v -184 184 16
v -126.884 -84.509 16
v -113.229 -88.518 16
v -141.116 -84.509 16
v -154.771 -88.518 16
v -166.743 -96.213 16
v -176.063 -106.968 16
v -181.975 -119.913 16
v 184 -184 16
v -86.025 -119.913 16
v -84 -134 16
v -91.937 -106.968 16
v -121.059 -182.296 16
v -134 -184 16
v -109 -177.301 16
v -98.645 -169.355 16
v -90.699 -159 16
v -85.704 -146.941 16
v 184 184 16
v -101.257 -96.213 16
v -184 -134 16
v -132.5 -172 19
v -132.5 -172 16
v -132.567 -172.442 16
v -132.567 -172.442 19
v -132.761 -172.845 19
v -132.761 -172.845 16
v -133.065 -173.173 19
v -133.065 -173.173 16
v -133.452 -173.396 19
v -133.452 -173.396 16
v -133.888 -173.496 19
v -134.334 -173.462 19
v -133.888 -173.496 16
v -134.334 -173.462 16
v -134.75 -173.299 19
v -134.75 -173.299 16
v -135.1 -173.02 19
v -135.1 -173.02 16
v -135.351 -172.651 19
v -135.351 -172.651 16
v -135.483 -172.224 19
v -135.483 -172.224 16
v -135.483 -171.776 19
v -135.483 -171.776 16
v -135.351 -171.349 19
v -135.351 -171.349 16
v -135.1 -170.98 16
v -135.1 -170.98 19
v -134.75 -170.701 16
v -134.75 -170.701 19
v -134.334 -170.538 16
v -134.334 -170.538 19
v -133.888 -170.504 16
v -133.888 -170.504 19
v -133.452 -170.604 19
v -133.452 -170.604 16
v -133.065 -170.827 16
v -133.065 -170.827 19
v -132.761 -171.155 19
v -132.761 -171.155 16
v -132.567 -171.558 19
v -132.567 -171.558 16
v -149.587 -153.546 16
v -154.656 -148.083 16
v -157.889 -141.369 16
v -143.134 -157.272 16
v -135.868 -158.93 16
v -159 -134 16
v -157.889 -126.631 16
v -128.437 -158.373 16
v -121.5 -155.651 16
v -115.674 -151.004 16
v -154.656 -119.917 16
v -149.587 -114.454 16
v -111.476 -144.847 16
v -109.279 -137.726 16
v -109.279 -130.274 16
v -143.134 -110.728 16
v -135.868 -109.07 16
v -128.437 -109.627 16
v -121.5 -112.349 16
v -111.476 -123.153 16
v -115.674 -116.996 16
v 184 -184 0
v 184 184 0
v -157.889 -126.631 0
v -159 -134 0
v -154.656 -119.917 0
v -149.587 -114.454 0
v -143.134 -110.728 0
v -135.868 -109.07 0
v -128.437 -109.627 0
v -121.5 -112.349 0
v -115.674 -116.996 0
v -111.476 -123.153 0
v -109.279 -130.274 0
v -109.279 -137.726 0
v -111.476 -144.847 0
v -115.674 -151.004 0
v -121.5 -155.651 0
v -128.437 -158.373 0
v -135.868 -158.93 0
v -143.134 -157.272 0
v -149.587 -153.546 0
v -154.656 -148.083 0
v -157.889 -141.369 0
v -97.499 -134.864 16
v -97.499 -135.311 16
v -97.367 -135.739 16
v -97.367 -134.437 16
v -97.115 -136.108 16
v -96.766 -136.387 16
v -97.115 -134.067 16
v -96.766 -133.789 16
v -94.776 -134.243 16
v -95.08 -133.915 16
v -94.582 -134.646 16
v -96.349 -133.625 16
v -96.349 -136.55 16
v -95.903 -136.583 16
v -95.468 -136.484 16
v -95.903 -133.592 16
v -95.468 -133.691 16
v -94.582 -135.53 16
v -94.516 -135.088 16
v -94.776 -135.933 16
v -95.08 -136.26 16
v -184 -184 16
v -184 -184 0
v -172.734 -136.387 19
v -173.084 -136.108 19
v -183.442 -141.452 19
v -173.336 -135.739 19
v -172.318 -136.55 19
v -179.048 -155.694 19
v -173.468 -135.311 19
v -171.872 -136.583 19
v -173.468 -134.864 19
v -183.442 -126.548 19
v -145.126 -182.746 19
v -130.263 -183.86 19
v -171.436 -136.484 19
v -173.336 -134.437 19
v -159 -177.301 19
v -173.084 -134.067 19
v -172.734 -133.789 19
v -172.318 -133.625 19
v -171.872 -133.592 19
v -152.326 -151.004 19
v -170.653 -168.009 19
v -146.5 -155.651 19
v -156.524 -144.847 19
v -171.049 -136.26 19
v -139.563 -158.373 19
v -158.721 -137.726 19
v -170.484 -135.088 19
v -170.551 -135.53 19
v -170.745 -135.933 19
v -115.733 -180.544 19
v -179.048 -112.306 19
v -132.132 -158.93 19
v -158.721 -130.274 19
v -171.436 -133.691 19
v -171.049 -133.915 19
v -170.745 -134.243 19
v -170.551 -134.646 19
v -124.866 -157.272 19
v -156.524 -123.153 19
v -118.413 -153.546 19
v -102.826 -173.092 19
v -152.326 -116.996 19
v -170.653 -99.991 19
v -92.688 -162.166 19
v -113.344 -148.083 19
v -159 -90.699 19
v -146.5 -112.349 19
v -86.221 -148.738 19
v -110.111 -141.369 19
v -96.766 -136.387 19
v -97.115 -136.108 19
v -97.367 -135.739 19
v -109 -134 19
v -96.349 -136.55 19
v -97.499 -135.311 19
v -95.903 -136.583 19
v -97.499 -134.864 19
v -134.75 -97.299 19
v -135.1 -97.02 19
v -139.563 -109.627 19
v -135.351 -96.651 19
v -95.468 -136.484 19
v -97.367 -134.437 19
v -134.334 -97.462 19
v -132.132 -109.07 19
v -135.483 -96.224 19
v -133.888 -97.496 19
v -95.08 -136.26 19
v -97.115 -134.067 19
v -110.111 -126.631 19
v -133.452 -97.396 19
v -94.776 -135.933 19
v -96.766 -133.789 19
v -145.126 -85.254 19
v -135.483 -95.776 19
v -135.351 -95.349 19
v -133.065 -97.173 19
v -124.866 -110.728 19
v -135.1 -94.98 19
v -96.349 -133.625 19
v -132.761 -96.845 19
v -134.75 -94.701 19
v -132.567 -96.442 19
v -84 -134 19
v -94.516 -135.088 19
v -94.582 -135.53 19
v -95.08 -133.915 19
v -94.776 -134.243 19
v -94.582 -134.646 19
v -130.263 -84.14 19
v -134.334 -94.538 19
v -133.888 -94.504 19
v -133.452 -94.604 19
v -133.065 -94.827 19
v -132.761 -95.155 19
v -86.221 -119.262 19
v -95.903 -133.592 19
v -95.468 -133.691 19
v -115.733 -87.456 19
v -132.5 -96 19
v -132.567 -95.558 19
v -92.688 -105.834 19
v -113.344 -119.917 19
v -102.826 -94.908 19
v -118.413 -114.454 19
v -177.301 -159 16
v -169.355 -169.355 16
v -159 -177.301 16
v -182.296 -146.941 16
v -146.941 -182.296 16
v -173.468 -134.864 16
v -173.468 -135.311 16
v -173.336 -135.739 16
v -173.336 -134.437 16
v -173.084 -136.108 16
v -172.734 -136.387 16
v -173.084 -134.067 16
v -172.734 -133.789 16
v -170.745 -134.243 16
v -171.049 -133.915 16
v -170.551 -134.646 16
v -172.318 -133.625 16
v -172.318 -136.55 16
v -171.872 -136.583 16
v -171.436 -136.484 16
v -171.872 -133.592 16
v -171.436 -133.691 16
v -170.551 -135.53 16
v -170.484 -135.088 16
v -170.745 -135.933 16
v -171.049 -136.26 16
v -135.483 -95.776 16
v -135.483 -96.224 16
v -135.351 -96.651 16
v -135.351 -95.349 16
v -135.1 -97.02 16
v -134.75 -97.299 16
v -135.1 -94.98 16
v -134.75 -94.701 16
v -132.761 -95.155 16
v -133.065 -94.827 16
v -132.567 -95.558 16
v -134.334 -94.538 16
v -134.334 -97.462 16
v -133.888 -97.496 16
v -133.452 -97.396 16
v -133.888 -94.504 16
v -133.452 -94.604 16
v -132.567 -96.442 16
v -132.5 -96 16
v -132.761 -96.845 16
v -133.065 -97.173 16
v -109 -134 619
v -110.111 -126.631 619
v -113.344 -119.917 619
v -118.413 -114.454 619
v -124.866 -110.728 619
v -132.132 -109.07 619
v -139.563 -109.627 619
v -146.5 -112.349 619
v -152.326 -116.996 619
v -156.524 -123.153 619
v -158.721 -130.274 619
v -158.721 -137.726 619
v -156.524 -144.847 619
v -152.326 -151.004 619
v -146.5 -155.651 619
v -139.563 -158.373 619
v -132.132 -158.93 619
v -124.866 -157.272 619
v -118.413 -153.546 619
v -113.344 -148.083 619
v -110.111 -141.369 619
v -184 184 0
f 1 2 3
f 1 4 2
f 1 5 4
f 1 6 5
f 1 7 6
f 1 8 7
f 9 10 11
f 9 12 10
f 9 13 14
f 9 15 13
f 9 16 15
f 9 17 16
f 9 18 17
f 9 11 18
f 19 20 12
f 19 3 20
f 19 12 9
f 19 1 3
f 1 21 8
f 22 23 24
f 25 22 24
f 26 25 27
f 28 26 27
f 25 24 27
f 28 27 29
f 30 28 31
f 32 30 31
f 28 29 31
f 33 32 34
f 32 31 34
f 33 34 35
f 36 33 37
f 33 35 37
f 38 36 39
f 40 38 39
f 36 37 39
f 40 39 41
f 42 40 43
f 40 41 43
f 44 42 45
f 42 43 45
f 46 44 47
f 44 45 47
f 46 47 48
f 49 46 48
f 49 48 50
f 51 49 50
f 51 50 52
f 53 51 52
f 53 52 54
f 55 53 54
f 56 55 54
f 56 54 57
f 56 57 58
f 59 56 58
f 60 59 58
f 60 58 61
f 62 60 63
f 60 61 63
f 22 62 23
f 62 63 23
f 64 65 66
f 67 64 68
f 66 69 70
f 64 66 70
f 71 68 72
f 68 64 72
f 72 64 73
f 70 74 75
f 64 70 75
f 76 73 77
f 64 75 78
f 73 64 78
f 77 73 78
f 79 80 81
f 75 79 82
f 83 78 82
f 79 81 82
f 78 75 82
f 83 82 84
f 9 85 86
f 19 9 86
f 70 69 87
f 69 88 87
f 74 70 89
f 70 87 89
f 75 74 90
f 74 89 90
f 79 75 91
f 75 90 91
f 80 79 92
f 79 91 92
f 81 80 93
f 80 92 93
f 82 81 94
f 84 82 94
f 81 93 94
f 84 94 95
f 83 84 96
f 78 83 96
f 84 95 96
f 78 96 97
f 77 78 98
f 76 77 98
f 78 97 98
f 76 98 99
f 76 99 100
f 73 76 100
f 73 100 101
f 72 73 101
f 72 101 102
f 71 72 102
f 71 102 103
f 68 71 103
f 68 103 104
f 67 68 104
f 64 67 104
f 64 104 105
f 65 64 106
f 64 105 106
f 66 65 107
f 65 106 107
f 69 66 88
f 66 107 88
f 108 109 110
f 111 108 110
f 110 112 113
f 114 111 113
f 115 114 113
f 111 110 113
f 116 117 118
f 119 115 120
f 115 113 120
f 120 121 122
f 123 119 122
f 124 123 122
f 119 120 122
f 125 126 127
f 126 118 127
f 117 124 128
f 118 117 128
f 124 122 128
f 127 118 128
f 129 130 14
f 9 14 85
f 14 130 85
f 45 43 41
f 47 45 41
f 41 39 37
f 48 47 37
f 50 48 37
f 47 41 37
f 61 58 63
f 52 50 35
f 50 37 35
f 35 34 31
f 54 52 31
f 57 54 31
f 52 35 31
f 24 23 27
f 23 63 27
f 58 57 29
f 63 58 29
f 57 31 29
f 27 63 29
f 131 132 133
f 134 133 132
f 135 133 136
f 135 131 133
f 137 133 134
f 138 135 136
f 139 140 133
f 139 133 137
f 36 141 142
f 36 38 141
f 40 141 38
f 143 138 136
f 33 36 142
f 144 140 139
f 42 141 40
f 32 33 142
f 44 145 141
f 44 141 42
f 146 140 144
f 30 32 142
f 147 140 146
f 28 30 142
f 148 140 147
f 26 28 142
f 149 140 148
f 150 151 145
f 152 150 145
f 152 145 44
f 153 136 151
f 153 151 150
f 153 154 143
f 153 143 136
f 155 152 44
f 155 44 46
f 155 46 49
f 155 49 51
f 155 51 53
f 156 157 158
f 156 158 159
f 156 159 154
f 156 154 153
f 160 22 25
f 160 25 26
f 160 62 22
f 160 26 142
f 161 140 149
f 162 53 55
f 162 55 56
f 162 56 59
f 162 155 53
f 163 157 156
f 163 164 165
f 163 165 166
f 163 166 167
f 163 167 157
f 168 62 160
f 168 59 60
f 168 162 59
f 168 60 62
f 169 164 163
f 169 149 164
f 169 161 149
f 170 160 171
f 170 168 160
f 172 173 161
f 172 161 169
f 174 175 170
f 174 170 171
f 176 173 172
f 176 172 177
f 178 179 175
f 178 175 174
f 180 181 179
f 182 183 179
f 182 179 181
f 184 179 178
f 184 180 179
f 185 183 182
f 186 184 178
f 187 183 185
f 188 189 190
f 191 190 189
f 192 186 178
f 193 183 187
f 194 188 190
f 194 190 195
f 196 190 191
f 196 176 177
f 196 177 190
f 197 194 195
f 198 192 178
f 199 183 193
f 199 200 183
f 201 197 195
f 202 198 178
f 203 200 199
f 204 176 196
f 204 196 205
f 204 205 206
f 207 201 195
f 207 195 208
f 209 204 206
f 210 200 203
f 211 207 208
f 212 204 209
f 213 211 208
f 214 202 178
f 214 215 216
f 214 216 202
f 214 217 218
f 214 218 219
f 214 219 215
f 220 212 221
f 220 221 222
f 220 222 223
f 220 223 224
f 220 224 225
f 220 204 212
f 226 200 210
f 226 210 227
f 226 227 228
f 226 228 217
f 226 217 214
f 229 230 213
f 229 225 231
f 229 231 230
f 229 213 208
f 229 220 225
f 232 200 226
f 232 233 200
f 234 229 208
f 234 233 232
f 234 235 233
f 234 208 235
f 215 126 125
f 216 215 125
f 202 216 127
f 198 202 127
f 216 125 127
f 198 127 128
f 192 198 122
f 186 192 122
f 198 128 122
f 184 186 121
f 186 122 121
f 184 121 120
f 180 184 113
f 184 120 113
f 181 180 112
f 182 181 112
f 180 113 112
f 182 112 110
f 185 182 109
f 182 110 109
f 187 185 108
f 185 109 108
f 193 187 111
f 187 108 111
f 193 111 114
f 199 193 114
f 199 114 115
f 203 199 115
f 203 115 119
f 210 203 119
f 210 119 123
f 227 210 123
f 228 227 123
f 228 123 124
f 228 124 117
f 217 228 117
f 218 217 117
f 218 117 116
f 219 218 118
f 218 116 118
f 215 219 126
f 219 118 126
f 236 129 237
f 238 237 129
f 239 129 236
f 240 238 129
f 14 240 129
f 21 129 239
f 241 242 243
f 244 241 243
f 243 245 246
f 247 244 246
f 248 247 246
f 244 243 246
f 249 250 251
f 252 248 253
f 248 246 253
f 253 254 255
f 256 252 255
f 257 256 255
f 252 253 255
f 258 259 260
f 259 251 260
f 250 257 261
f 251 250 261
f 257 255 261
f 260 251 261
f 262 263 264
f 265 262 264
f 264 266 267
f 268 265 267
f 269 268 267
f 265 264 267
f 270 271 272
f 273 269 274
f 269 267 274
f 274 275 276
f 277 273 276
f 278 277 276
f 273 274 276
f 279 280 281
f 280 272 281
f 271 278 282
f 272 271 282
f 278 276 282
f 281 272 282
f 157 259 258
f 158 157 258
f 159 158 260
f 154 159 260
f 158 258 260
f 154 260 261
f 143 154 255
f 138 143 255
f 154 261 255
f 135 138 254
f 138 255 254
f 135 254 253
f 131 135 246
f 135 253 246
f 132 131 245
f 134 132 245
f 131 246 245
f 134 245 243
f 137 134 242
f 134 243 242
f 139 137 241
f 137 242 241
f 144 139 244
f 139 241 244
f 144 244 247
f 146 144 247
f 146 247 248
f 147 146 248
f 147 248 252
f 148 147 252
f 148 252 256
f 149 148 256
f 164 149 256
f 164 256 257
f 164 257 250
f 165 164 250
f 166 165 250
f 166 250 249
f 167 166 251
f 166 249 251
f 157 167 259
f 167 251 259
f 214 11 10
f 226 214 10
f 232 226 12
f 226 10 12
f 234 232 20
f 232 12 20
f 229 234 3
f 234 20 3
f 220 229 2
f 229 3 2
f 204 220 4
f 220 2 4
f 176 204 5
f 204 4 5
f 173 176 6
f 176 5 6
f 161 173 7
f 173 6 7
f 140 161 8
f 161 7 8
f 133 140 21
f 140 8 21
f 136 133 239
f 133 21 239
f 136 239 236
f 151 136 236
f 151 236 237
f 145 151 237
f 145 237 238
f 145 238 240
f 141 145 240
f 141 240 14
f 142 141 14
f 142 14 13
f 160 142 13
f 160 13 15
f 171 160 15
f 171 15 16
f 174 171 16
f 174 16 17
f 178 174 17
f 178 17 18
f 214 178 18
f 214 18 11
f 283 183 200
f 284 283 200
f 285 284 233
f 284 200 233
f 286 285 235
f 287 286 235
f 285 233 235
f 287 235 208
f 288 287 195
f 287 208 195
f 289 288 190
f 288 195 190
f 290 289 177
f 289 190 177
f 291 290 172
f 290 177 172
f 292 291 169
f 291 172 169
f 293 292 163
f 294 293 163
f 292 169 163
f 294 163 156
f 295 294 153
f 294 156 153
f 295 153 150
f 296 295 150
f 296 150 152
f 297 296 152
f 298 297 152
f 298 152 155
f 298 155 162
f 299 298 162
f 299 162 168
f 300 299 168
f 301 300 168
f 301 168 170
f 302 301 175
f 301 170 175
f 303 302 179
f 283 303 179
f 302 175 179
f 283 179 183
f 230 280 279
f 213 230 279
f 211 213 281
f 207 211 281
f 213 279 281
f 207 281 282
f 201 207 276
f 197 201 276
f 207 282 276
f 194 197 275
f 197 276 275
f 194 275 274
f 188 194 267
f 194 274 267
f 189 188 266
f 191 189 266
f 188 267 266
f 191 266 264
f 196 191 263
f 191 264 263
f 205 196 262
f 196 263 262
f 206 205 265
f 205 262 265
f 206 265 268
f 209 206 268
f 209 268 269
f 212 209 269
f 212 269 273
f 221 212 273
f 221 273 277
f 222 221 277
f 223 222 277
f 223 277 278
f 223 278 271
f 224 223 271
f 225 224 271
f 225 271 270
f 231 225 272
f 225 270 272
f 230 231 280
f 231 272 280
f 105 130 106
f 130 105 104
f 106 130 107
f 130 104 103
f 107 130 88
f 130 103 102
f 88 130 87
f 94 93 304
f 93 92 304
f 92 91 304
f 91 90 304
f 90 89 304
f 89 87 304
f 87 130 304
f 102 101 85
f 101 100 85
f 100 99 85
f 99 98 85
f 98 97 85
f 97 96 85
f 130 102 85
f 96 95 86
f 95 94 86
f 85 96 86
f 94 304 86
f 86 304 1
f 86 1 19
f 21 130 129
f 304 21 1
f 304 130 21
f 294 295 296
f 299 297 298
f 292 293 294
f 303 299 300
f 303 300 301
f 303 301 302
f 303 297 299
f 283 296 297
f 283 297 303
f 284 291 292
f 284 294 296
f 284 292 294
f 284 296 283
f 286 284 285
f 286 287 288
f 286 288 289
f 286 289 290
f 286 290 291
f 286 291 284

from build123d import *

# Parameters (mm, degrees)
F0_W     = 368
F0_H     = 368
F1_DEPTH = 16
F3_D     = 50
F3_DEPTH = 16
F3_TIP   = 15.0215154757
F2_R     = 50
F4_DEPTH = 3
F7_R     = 25
F8_DEPTH = 600
F9_D     = 3
F9_DEPTH = 3
F9_TIP   = 0.9012909285


# Not quite as in the source:
# - the program builds the solid bodies; features that only make, move or delete a surface that nothing else refers to are left out


with BuildPart() as f1:
    # F0 (on Top) → F1 (new body)
    with BuildSketch(Plane.XY):
        Rectangle(F0_W, F0_H)
    extrude(amount=F1_DEPTH)

    # F3
    with Locations(Plane.XY.offset(16)):
        with Locations((-134, -134)):
            Hole(F3_D / 2, depth=F3_DEPTH)
            with Locations((0, 0, -(F3_DEPTH + F3_TIP / 2))):  # 118° drill point
                Cone(0, F3_D / 2, F3_TIP, mode=Mode.SUBTRACT)

    # F2 (on face) → F4 (join)
    with BuildSketch(Plane.XY.offset(16)):
        with Locations((-134, -134)):
            Circle(F2_R)
    extrude(amount=F4_DEPTH)

    # F7 (on face) → F8 (join)
    with BuildSketch(Plane.XY.offset(19)):
        with Locations((-134, -134)):
            Circle(F7_R)
    extrude(amount=F8_DEPTH)

    # F9 (one way)
    with BuildSketch(Plane(origin=(0, 0, 16), x_dir=(1, 0, 0), z_dir=(0, 0, -1))):
        with Locations((-134, 96), (-171.9844305378, 135.0876749154), (-96.0155694622, 135.0876749154), (-134, 172)):
            Circle(F9_D / 2)
    extrude(amount=-F9_DEPTH, mode=Mode.SUBTRACT)
    with Locations(Plane(origin=(0, 0, 16), x_dir=(1, 0, 0), z_dir=(0, 0, -1))):
        with Locations((-134, 96), (-171.9844305378, 135.0876749154), (-96.0155694622, 135.0876749154), (-134, 172)):
            with Locations((0, 0, -(F9_DEPTH + F9_TIP / 2))):  # 118° drill point
                Cone(0, F9_D / 2, F9_TIP, mode=Mode.SUBTRACT)


solid = f1.part
